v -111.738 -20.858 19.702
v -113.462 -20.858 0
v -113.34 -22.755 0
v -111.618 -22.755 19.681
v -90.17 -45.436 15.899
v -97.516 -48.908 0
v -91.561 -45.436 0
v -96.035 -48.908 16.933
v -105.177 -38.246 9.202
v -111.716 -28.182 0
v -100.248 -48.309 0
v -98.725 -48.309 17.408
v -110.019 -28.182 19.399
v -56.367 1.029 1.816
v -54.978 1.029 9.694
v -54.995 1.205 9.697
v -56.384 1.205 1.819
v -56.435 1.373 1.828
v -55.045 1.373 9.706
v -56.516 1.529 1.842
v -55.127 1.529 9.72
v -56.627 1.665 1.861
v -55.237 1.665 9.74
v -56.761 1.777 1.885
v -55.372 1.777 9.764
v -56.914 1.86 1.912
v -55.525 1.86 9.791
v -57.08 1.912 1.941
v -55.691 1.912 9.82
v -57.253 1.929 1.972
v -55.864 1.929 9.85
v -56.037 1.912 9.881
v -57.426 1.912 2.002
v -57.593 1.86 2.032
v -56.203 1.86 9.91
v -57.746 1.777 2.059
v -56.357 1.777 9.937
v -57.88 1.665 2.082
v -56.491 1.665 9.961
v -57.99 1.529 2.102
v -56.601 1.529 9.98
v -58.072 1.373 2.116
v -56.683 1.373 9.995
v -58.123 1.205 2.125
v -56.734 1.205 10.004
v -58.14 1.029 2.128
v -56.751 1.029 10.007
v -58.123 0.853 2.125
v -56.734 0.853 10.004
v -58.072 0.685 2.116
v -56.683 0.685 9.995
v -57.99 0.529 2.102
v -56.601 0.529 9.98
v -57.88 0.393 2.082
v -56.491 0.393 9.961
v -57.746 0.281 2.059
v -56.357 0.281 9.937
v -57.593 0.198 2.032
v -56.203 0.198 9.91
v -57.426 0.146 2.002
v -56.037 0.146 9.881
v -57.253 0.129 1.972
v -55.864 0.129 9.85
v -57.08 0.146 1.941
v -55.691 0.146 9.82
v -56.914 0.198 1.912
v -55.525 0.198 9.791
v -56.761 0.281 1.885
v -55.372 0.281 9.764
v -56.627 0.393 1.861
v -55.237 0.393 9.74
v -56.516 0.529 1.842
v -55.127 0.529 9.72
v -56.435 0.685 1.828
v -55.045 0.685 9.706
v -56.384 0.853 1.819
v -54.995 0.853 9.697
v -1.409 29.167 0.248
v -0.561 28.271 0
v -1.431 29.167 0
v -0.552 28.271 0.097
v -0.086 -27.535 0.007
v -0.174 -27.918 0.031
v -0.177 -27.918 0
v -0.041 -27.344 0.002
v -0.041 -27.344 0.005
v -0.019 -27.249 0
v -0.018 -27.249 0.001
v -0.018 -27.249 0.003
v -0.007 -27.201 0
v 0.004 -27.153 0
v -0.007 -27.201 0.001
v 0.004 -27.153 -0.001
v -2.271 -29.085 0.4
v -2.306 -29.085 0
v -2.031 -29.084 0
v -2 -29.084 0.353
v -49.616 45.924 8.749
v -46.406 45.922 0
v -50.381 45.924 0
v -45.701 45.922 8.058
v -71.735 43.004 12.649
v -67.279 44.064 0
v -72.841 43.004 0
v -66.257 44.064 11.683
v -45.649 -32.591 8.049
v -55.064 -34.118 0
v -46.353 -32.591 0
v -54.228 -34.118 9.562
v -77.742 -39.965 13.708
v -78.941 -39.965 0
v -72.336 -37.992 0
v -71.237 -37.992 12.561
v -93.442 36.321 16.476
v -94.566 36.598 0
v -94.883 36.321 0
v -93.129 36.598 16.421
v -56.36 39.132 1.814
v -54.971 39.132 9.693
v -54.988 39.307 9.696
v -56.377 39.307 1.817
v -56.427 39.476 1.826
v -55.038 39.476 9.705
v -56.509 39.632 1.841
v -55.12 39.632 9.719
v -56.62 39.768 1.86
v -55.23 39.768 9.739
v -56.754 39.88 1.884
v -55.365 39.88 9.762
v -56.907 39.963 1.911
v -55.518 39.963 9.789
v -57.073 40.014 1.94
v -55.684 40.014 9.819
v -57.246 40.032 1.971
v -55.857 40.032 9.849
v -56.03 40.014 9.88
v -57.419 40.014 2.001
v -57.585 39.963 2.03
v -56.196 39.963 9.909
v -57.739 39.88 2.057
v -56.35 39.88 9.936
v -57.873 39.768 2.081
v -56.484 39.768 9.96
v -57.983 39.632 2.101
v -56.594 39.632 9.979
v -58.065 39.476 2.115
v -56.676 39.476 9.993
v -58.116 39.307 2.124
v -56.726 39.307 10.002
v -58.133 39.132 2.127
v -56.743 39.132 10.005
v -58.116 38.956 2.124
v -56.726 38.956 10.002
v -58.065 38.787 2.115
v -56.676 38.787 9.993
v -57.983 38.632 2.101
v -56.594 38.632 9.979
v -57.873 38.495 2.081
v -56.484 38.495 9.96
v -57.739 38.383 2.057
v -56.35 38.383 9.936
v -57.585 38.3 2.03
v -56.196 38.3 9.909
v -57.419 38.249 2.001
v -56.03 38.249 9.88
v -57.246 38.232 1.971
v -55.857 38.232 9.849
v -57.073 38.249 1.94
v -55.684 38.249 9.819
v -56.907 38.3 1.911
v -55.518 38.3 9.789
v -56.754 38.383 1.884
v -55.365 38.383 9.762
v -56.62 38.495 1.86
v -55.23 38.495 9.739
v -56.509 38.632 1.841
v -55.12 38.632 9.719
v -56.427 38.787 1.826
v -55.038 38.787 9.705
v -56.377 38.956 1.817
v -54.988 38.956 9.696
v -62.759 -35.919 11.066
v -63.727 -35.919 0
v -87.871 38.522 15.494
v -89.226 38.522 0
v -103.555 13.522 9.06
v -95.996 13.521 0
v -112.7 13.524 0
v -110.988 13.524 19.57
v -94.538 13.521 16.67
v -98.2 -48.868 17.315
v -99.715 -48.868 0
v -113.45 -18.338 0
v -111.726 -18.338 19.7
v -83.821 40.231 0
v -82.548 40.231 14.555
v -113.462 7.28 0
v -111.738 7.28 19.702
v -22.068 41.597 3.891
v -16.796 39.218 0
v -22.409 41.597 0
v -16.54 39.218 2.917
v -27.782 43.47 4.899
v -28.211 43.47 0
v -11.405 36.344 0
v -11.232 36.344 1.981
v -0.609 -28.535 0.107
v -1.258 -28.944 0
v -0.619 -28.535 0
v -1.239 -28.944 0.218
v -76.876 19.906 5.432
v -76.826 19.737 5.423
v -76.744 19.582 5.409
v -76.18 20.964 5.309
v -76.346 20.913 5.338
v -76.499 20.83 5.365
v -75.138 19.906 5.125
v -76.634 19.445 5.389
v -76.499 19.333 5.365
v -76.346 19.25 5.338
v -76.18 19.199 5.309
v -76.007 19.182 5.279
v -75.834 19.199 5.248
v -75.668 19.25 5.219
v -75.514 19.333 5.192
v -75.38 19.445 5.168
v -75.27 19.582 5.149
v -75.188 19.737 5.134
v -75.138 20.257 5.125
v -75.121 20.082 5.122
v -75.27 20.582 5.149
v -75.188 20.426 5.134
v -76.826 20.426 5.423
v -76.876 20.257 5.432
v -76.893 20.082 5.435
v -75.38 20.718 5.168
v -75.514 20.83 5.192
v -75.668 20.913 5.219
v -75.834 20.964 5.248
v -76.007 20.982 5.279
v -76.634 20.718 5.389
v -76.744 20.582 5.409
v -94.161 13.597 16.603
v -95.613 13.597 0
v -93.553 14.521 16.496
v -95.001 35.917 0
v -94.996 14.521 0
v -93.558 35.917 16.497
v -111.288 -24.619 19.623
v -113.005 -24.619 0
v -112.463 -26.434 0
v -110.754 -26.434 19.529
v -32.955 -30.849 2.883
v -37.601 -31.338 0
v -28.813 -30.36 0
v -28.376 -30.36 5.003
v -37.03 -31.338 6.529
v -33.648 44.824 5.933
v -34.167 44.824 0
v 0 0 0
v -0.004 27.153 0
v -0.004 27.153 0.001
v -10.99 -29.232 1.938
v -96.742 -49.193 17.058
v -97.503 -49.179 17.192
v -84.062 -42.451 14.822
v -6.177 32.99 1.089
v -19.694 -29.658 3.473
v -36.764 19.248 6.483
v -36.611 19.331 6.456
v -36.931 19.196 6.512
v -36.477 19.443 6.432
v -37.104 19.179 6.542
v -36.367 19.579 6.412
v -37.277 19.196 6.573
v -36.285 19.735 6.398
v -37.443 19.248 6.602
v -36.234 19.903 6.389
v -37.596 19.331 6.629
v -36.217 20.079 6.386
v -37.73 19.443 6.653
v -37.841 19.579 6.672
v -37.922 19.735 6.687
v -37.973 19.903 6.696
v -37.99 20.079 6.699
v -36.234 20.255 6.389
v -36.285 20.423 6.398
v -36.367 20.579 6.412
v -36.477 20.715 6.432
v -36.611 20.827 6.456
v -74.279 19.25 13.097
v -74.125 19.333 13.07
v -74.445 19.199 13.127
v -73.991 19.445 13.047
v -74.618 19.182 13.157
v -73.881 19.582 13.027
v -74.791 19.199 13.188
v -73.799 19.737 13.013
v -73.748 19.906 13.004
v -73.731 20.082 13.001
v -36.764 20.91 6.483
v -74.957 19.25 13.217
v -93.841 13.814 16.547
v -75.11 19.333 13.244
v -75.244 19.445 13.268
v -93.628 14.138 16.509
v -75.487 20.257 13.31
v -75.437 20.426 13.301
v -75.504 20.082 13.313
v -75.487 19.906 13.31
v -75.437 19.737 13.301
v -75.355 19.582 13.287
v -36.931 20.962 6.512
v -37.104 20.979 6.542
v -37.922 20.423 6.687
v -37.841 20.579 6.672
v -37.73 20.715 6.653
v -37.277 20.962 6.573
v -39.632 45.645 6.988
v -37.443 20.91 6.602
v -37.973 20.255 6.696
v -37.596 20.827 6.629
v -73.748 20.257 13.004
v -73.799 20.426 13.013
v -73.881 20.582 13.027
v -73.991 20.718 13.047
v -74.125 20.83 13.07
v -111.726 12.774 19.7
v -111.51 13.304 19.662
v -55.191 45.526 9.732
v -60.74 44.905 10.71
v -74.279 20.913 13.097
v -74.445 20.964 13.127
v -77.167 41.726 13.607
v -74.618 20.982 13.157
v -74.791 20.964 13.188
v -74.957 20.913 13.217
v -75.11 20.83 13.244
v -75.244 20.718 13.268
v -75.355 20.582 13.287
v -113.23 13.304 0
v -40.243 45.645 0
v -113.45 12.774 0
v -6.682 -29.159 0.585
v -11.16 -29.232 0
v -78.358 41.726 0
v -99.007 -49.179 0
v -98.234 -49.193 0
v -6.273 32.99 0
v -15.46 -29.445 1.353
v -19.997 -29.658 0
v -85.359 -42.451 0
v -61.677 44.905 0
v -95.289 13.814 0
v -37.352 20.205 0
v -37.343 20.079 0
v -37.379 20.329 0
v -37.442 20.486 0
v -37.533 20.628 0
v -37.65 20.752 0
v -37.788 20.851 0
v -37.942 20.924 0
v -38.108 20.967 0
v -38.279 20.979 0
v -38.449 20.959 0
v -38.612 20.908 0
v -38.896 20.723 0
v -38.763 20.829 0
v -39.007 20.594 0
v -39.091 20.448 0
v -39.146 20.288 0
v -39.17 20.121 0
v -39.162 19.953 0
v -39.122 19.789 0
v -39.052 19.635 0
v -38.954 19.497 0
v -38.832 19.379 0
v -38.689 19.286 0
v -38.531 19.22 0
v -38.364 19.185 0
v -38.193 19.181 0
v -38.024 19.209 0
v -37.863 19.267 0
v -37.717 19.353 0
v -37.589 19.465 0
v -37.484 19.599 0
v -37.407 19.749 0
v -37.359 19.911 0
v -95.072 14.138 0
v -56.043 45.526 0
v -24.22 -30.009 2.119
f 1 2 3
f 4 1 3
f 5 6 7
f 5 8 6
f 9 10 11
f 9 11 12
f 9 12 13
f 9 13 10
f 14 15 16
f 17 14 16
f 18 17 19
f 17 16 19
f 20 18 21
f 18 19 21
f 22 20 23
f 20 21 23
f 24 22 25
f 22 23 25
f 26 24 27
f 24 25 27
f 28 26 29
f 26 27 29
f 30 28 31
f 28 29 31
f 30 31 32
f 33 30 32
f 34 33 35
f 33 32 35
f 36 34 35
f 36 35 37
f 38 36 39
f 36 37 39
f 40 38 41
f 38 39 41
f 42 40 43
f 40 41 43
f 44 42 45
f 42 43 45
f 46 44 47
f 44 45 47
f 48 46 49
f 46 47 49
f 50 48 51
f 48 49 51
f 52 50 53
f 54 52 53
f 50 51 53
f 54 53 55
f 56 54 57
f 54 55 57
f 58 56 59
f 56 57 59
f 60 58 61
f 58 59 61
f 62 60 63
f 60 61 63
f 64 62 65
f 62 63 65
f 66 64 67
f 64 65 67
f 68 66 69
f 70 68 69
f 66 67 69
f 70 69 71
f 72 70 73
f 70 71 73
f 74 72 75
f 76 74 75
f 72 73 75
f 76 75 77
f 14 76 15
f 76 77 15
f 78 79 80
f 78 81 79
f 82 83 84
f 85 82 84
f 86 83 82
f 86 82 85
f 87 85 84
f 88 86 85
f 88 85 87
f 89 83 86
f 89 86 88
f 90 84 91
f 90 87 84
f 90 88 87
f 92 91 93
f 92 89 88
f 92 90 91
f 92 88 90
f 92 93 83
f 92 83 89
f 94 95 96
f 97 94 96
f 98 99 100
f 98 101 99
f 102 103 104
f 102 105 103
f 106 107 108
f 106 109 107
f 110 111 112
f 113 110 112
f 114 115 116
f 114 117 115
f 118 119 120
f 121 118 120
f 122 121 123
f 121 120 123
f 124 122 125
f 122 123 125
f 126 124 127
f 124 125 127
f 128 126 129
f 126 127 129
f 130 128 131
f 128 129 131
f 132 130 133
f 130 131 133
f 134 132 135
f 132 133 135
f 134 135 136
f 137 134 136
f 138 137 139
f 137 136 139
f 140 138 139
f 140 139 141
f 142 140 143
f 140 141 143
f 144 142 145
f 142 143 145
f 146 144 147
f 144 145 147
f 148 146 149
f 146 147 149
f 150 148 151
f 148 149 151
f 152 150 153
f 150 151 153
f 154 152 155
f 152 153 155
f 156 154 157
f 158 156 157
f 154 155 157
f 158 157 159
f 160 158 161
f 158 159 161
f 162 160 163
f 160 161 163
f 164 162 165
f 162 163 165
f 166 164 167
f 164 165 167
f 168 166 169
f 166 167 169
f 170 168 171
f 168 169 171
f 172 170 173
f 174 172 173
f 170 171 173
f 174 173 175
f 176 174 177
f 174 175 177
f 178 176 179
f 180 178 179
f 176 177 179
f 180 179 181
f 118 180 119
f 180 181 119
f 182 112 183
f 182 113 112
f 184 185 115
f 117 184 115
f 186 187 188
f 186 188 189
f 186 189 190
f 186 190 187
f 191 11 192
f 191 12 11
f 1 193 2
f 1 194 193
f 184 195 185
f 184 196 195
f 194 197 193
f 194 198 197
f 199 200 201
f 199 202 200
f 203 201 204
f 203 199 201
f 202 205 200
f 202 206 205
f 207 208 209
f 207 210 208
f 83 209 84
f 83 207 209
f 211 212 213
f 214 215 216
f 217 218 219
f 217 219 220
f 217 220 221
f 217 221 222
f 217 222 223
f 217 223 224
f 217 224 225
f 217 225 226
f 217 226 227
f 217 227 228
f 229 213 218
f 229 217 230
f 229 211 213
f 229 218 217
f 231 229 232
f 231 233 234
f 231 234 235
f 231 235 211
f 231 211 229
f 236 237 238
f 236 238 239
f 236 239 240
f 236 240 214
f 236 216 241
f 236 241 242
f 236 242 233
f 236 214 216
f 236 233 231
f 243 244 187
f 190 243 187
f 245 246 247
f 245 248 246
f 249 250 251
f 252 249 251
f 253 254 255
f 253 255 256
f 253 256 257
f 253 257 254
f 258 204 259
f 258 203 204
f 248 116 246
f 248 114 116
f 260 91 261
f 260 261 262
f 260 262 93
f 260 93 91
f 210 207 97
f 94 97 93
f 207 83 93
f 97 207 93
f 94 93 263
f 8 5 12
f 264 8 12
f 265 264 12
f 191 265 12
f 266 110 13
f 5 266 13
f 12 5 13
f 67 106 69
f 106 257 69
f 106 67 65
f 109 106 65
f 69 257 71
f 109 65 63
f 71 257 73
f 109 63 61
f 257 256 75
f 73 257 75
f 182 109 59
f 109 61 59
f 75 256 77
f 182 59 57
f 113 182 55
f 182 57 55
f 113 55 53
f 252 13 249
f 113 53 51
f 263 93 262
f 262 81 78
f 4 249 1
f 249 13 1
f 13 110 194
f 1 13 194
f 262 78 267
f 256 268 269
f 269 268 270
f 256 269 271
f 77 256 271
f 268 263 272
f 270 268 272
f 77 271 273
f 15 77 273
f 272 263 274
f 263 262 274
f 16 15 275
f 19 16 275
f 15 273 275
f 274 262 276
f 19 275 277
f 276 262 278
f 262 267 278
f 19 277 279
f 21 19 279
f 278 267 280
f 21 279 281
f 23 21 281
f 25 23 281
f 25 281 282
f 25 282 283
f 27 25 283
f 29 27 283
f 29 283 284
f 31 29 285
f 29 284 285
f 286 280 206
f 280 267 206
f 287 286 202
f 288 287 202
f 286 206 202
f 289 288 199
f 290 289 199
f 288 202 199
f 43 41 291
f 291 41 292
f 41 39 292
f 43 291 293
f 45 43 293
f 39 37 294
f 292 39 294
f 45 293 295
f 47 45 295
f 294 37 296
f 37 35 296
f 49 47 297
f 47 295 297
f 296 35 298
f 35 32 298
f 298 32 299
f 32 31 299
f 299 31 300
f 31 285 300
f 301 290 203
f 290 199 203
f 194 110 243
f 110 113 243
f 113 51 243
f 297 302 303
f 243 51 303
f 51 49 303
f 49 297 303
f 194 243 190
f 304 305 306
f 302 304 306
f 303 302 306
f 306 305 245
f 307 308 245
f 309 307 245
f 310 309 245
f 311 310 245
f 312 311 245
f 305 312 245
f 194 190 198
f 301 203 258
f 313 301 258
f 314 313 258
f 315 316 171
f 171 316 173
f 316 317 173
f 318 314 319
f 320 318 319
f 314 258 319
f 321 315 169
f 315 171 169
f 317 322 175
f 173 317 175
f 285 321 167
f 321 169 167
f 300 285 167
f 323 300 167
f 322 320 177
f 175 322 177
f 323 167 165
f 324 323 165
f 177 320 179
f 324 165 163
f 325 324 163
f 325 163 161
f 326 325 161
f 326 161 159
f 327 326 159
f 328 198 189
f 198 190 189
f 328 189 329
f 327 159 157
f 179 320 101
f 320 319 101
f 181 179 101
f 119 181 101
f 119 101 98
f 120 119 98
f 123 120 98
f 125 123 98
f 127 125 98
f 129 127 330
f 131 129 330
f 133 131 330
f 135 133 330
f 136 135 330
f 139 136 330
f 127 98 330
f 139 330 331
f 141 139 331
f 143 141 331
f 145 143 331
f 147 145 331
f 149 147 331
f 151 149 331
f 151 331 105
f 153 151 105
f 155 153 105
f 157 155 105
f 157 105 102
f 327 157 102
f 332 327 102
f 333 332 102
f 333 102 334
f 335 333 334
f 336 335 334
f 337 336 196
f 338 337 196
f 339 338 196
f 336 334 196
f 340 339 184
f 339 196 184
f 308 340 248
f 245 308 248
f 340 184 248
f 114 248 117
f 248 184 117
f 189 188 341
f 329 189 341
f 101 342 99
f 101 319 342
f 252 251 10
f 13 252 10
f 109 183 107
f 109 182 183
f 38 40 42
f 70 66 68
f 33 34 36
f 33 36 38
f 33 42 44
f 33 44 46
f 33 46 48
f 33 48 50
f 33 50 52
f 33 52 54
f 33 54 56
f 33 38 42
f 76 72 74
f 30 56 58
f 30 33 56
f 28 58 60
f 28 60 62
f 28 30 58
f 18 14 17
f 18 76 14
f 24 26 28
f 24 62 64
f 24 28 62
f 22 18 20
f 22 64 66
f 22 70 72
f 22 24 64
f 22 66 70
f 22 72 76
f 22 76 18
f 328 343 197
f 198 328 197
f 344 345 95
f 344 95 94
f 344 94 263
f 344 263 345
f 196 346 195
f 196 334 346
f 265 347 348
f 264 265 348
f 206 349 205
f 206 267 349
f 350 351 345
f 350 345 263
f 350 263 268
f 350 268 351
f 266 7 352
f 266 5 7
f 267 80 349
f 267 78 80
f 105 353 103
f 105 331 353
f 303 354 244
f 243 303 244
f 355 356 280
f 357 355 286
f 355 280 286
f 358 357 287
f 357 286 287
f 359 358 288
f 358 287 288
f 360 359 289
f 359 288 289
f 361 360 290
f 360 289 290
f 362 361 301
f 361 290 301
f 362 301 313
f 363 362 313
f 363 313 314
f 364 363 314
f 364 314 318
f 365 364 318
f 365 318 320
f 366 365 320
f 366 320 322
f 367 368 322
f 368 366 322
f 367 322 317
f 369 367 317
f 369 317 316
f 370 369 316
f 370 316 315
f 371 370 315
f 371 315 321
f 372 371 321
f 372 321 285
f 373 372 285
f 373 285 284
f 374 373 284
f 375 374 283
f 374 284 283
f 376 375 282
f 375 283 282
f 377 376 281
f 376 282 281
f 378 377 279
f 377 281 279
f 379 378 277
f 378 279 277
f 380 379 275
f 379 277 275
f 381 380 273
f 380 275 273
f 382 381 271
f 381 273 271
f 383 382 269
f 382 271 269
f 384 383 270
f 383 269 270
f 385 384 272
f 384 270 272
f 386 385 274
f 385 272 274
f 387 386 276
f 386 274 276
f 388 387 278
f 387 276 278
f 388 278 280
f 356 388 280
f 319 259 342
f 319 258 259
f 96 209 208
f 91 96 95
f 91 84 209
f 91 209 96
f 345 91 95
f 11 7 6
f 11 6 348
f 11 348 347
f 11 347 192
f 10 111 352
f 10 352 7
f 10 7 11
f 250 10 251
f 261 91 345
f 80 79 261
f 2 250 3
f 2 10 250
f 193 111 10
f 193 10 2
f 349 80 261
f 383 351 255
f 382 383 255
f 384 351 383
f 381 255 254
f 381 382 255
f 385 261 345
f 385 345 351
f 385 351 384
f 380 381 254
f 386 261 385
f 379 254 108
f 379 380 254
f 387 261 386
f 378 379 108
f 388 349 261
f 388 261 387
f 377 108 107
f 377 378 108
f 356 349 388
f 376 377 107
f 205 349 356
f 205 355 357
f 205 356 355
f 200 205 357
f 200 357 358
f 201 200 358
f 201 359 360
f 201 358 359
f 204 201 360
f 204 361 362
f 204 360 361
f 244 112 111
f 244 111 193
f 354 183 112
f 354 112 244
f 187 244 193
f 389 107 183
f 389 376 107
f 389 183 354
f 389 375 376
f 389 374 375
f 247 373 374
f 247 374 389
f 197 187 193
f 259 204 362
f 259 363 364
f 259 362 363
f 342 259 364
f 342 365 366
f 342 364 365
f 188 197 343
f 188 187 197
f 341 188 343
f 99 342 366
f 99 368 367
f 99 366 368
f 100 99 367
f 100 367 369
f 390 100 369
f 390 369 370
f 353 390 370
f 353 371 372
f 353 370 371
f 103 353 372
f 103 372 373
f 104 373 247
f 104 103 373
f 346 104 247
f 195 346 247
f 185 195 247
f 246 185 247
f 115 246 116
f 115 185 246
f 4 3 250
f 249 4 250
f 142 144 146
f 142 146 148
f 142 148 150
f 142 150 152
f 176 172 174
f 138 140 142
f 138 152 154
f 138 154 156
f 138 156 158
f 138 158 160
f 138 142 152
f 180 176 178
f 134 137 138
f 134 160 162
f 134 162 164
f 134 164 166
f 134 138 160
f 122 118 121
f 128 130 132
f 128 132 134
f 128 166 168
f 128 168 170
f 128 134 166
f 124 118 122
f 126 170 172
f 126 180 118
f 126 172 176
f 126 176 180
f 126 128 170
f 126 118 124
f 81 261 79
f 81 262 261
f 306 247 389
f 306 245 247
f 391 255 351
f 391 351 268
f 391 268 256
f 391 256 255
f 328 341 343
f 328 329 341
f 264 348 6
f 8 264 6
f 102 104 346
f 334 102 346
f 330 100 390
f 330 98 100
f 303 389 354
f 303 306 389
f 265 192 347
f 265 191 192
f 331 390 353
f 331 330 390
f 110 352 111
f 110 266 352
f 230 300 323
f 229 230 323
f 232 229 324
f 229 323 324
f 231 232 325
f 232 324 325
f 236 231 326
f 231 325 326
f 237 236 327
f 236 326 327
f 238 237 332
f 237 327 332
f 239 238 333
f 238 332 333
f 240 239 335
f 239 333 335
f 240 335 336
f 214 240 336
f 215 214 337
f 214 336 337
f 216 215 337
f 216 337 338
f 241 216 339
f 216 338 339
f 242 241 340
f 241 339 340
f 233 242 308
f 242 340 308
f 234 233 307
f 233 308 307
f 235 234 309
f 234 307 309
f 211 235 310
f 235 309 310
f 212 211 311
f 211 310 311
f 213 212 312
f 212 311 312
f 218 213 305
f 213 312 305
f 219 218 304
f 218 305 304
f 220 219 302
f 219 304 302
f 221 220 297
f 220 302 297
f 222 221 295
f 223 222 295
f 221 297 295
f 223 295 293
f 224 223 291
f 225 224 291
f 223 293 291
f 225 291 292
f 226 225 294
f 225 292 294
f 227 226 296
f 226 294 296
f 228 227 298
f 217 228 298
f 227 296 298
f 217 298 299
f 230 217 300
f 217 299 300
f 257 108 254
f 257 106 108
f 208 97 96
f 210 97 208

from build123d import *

# Parameters (mm, degrees)
SKETCH_R     = 0.9
POCKET_DEPTH = 8


with BuildPart() as part:
    # Sketch001 → AdditiveLoft section 0
    with BuildSketch(Plane.XY):
        Polygon((-2.031, -29.0839), (-1.257947, -28.943732), (-0.618525, -28.534747), (-0.176591, -27.917639), (0.004, -27.153), (-0.004, 27.153), (-0.560859, 28.270986), (-1.431, 29.167), (-6.272512, 32.989791), (-11.405458, 36.344259), (-16.795601, 39.217647), (-22.408705, 41.597202), (-28.210534, 43.470169), (-34.16685, 44.823794), (-40.243418, 45.645323), (-46.406, 45.922), (-50.381, 45.924), (-56.042517, 45.525582), (-61.677386, 44.905206), (-67.27916, 44.064231), (-72.841394, 43.004018), (-78.357641, 41.725928), (-83.821455, 40.231321), (-89.22639, 38.521558), (-94.566, 36.598), (-94.883057, 36.321094), (-95.001, 35.917), (-94.996, 14.521), (-95.07212, 14.138317), (-95.288893, 13.813893), (-95.613317, 13.59712), (-95.996, 13.521), (-112.7, 13.524), (-113.23033, 13.30433), (-113.45, 12.774), (-113.462, 7.28), (-113.45, -18.3385), (-113.462, -20.858), (-113.339801, -22.754576), (-113.005248, -24.61928), (-112.462571, -26.434368), (-111.716, -28.1821), (-100.248, -48.3093), (-99.714625, -48.868478), (-99.006985, -49.178983), (-98.234343, -49.192872), (-97.516, -48.908), (-91.560821, -45.435951), (-85.35926, -42.450719), (-78.941069, -39.965203), (-72.336, -37.9923), (-63.727397, -35.91899), (-55.064358, -34.118273), (-46.353366, -32.590974), (-37.600904, -31.337917), (-28.813454, -30.359926), (-19.997498, -29.657827), (-11.159519, -29.232443), (-2.306, -29.0846), align=None)
    # Sketch002 (on DatumPlane) → AdditiveLoft section 1
    with BuildSketch(Plane(origin=(0, 0, 0), x_dir=(0.984808, 0, -0.173648), z_dir=(0.173648, 0, 0.984808))):
        Polygon((-2.030999, -29.083908), (-1.257947, -28.943732), (-0.618525, -28.534747), (-0.176591, -27.917639), (0.004, -27.153), (-0.004, 27.153), (-0.560859, 28.270986), (-1.431, 29.167), (-6.272512, 32.989791), (-11.405458, 36.344259), (-16.795601, 39.217647), (-22.408705, 41.597202), (-28.210534, 43.470169), (-34.16685, 44.823794), (-40.243418, 45.645323), (-46.406, 45.922), (-50.381, 45.924), (-56.042517, 45.525582), (-61.677386, 44.905206), (-67.27916, 44.064231), (-72.841394, 43.004018), (-78.357641, 41.725928), (-83.821455, 40.231321), (-89.22639, 38.521558), (-94.566, 36.598), (-94.883057, 36.321094), (-95.001, 35.917), (-94.996, 14.521), (-95.07212, 14.138317), (-95.288893, 13.813893), (-95.613317, 13.59712), (-95.996, 13.521), (-112.7, 13.524), (-113.23033, 13.30433), (-113.45, 12.774), (-113.462, 7.28), (-113.45, -18.3385), (-113.462, -20.858), (-113.339801, -22.754576), (-113.005248, -24.61928), (-112.462571, -26.434368), (-111.716, -28.1821), (-100.248, -48.3093), (-99.714625, -48.868478), (-99.006985, -49.178983), (-98.234343, -49.192872), (-97.516, -48.908), (-91.560821, -45.435951), (-85.35926, -42.450719), (-78.941069, -39.965203), (-72.336, -37.9923), (-63.727397, -35.91899), (-55.064358, -34.118273), (-46.353366, -32.590974), (-37.600904, -31.337917), (-28.813454, -30.359926), (-19.997498, -29.657827), (-11.159519, -29.232443), (-2.306, -29.0846), align=None)
    loft()

    # Sketch (on DatumPlane) → Pocket (cut)
    with BuildSketch(Plane(origin=(0, 0, 0), x_dir=(0.984808, 0, -0.173648), z_dir=(0.173648, 0, 0.984808))):
        with Locations((-75.768781, 20.08171)):
            Circle(SKETCH_R)
        with Locations((-56.718781, 39.131712)):
            Circle(SKETCH_R)
        with Locations((-37.676, 20.079)):
            Circle(SKETCH_R)
        with Locations((-56.726, 1.029)):
            Circle(SKETCH_R)
    extrude(amount=-POCKET_DEPTH, mode=Mode.SUBTRACT)


solid = part.part
